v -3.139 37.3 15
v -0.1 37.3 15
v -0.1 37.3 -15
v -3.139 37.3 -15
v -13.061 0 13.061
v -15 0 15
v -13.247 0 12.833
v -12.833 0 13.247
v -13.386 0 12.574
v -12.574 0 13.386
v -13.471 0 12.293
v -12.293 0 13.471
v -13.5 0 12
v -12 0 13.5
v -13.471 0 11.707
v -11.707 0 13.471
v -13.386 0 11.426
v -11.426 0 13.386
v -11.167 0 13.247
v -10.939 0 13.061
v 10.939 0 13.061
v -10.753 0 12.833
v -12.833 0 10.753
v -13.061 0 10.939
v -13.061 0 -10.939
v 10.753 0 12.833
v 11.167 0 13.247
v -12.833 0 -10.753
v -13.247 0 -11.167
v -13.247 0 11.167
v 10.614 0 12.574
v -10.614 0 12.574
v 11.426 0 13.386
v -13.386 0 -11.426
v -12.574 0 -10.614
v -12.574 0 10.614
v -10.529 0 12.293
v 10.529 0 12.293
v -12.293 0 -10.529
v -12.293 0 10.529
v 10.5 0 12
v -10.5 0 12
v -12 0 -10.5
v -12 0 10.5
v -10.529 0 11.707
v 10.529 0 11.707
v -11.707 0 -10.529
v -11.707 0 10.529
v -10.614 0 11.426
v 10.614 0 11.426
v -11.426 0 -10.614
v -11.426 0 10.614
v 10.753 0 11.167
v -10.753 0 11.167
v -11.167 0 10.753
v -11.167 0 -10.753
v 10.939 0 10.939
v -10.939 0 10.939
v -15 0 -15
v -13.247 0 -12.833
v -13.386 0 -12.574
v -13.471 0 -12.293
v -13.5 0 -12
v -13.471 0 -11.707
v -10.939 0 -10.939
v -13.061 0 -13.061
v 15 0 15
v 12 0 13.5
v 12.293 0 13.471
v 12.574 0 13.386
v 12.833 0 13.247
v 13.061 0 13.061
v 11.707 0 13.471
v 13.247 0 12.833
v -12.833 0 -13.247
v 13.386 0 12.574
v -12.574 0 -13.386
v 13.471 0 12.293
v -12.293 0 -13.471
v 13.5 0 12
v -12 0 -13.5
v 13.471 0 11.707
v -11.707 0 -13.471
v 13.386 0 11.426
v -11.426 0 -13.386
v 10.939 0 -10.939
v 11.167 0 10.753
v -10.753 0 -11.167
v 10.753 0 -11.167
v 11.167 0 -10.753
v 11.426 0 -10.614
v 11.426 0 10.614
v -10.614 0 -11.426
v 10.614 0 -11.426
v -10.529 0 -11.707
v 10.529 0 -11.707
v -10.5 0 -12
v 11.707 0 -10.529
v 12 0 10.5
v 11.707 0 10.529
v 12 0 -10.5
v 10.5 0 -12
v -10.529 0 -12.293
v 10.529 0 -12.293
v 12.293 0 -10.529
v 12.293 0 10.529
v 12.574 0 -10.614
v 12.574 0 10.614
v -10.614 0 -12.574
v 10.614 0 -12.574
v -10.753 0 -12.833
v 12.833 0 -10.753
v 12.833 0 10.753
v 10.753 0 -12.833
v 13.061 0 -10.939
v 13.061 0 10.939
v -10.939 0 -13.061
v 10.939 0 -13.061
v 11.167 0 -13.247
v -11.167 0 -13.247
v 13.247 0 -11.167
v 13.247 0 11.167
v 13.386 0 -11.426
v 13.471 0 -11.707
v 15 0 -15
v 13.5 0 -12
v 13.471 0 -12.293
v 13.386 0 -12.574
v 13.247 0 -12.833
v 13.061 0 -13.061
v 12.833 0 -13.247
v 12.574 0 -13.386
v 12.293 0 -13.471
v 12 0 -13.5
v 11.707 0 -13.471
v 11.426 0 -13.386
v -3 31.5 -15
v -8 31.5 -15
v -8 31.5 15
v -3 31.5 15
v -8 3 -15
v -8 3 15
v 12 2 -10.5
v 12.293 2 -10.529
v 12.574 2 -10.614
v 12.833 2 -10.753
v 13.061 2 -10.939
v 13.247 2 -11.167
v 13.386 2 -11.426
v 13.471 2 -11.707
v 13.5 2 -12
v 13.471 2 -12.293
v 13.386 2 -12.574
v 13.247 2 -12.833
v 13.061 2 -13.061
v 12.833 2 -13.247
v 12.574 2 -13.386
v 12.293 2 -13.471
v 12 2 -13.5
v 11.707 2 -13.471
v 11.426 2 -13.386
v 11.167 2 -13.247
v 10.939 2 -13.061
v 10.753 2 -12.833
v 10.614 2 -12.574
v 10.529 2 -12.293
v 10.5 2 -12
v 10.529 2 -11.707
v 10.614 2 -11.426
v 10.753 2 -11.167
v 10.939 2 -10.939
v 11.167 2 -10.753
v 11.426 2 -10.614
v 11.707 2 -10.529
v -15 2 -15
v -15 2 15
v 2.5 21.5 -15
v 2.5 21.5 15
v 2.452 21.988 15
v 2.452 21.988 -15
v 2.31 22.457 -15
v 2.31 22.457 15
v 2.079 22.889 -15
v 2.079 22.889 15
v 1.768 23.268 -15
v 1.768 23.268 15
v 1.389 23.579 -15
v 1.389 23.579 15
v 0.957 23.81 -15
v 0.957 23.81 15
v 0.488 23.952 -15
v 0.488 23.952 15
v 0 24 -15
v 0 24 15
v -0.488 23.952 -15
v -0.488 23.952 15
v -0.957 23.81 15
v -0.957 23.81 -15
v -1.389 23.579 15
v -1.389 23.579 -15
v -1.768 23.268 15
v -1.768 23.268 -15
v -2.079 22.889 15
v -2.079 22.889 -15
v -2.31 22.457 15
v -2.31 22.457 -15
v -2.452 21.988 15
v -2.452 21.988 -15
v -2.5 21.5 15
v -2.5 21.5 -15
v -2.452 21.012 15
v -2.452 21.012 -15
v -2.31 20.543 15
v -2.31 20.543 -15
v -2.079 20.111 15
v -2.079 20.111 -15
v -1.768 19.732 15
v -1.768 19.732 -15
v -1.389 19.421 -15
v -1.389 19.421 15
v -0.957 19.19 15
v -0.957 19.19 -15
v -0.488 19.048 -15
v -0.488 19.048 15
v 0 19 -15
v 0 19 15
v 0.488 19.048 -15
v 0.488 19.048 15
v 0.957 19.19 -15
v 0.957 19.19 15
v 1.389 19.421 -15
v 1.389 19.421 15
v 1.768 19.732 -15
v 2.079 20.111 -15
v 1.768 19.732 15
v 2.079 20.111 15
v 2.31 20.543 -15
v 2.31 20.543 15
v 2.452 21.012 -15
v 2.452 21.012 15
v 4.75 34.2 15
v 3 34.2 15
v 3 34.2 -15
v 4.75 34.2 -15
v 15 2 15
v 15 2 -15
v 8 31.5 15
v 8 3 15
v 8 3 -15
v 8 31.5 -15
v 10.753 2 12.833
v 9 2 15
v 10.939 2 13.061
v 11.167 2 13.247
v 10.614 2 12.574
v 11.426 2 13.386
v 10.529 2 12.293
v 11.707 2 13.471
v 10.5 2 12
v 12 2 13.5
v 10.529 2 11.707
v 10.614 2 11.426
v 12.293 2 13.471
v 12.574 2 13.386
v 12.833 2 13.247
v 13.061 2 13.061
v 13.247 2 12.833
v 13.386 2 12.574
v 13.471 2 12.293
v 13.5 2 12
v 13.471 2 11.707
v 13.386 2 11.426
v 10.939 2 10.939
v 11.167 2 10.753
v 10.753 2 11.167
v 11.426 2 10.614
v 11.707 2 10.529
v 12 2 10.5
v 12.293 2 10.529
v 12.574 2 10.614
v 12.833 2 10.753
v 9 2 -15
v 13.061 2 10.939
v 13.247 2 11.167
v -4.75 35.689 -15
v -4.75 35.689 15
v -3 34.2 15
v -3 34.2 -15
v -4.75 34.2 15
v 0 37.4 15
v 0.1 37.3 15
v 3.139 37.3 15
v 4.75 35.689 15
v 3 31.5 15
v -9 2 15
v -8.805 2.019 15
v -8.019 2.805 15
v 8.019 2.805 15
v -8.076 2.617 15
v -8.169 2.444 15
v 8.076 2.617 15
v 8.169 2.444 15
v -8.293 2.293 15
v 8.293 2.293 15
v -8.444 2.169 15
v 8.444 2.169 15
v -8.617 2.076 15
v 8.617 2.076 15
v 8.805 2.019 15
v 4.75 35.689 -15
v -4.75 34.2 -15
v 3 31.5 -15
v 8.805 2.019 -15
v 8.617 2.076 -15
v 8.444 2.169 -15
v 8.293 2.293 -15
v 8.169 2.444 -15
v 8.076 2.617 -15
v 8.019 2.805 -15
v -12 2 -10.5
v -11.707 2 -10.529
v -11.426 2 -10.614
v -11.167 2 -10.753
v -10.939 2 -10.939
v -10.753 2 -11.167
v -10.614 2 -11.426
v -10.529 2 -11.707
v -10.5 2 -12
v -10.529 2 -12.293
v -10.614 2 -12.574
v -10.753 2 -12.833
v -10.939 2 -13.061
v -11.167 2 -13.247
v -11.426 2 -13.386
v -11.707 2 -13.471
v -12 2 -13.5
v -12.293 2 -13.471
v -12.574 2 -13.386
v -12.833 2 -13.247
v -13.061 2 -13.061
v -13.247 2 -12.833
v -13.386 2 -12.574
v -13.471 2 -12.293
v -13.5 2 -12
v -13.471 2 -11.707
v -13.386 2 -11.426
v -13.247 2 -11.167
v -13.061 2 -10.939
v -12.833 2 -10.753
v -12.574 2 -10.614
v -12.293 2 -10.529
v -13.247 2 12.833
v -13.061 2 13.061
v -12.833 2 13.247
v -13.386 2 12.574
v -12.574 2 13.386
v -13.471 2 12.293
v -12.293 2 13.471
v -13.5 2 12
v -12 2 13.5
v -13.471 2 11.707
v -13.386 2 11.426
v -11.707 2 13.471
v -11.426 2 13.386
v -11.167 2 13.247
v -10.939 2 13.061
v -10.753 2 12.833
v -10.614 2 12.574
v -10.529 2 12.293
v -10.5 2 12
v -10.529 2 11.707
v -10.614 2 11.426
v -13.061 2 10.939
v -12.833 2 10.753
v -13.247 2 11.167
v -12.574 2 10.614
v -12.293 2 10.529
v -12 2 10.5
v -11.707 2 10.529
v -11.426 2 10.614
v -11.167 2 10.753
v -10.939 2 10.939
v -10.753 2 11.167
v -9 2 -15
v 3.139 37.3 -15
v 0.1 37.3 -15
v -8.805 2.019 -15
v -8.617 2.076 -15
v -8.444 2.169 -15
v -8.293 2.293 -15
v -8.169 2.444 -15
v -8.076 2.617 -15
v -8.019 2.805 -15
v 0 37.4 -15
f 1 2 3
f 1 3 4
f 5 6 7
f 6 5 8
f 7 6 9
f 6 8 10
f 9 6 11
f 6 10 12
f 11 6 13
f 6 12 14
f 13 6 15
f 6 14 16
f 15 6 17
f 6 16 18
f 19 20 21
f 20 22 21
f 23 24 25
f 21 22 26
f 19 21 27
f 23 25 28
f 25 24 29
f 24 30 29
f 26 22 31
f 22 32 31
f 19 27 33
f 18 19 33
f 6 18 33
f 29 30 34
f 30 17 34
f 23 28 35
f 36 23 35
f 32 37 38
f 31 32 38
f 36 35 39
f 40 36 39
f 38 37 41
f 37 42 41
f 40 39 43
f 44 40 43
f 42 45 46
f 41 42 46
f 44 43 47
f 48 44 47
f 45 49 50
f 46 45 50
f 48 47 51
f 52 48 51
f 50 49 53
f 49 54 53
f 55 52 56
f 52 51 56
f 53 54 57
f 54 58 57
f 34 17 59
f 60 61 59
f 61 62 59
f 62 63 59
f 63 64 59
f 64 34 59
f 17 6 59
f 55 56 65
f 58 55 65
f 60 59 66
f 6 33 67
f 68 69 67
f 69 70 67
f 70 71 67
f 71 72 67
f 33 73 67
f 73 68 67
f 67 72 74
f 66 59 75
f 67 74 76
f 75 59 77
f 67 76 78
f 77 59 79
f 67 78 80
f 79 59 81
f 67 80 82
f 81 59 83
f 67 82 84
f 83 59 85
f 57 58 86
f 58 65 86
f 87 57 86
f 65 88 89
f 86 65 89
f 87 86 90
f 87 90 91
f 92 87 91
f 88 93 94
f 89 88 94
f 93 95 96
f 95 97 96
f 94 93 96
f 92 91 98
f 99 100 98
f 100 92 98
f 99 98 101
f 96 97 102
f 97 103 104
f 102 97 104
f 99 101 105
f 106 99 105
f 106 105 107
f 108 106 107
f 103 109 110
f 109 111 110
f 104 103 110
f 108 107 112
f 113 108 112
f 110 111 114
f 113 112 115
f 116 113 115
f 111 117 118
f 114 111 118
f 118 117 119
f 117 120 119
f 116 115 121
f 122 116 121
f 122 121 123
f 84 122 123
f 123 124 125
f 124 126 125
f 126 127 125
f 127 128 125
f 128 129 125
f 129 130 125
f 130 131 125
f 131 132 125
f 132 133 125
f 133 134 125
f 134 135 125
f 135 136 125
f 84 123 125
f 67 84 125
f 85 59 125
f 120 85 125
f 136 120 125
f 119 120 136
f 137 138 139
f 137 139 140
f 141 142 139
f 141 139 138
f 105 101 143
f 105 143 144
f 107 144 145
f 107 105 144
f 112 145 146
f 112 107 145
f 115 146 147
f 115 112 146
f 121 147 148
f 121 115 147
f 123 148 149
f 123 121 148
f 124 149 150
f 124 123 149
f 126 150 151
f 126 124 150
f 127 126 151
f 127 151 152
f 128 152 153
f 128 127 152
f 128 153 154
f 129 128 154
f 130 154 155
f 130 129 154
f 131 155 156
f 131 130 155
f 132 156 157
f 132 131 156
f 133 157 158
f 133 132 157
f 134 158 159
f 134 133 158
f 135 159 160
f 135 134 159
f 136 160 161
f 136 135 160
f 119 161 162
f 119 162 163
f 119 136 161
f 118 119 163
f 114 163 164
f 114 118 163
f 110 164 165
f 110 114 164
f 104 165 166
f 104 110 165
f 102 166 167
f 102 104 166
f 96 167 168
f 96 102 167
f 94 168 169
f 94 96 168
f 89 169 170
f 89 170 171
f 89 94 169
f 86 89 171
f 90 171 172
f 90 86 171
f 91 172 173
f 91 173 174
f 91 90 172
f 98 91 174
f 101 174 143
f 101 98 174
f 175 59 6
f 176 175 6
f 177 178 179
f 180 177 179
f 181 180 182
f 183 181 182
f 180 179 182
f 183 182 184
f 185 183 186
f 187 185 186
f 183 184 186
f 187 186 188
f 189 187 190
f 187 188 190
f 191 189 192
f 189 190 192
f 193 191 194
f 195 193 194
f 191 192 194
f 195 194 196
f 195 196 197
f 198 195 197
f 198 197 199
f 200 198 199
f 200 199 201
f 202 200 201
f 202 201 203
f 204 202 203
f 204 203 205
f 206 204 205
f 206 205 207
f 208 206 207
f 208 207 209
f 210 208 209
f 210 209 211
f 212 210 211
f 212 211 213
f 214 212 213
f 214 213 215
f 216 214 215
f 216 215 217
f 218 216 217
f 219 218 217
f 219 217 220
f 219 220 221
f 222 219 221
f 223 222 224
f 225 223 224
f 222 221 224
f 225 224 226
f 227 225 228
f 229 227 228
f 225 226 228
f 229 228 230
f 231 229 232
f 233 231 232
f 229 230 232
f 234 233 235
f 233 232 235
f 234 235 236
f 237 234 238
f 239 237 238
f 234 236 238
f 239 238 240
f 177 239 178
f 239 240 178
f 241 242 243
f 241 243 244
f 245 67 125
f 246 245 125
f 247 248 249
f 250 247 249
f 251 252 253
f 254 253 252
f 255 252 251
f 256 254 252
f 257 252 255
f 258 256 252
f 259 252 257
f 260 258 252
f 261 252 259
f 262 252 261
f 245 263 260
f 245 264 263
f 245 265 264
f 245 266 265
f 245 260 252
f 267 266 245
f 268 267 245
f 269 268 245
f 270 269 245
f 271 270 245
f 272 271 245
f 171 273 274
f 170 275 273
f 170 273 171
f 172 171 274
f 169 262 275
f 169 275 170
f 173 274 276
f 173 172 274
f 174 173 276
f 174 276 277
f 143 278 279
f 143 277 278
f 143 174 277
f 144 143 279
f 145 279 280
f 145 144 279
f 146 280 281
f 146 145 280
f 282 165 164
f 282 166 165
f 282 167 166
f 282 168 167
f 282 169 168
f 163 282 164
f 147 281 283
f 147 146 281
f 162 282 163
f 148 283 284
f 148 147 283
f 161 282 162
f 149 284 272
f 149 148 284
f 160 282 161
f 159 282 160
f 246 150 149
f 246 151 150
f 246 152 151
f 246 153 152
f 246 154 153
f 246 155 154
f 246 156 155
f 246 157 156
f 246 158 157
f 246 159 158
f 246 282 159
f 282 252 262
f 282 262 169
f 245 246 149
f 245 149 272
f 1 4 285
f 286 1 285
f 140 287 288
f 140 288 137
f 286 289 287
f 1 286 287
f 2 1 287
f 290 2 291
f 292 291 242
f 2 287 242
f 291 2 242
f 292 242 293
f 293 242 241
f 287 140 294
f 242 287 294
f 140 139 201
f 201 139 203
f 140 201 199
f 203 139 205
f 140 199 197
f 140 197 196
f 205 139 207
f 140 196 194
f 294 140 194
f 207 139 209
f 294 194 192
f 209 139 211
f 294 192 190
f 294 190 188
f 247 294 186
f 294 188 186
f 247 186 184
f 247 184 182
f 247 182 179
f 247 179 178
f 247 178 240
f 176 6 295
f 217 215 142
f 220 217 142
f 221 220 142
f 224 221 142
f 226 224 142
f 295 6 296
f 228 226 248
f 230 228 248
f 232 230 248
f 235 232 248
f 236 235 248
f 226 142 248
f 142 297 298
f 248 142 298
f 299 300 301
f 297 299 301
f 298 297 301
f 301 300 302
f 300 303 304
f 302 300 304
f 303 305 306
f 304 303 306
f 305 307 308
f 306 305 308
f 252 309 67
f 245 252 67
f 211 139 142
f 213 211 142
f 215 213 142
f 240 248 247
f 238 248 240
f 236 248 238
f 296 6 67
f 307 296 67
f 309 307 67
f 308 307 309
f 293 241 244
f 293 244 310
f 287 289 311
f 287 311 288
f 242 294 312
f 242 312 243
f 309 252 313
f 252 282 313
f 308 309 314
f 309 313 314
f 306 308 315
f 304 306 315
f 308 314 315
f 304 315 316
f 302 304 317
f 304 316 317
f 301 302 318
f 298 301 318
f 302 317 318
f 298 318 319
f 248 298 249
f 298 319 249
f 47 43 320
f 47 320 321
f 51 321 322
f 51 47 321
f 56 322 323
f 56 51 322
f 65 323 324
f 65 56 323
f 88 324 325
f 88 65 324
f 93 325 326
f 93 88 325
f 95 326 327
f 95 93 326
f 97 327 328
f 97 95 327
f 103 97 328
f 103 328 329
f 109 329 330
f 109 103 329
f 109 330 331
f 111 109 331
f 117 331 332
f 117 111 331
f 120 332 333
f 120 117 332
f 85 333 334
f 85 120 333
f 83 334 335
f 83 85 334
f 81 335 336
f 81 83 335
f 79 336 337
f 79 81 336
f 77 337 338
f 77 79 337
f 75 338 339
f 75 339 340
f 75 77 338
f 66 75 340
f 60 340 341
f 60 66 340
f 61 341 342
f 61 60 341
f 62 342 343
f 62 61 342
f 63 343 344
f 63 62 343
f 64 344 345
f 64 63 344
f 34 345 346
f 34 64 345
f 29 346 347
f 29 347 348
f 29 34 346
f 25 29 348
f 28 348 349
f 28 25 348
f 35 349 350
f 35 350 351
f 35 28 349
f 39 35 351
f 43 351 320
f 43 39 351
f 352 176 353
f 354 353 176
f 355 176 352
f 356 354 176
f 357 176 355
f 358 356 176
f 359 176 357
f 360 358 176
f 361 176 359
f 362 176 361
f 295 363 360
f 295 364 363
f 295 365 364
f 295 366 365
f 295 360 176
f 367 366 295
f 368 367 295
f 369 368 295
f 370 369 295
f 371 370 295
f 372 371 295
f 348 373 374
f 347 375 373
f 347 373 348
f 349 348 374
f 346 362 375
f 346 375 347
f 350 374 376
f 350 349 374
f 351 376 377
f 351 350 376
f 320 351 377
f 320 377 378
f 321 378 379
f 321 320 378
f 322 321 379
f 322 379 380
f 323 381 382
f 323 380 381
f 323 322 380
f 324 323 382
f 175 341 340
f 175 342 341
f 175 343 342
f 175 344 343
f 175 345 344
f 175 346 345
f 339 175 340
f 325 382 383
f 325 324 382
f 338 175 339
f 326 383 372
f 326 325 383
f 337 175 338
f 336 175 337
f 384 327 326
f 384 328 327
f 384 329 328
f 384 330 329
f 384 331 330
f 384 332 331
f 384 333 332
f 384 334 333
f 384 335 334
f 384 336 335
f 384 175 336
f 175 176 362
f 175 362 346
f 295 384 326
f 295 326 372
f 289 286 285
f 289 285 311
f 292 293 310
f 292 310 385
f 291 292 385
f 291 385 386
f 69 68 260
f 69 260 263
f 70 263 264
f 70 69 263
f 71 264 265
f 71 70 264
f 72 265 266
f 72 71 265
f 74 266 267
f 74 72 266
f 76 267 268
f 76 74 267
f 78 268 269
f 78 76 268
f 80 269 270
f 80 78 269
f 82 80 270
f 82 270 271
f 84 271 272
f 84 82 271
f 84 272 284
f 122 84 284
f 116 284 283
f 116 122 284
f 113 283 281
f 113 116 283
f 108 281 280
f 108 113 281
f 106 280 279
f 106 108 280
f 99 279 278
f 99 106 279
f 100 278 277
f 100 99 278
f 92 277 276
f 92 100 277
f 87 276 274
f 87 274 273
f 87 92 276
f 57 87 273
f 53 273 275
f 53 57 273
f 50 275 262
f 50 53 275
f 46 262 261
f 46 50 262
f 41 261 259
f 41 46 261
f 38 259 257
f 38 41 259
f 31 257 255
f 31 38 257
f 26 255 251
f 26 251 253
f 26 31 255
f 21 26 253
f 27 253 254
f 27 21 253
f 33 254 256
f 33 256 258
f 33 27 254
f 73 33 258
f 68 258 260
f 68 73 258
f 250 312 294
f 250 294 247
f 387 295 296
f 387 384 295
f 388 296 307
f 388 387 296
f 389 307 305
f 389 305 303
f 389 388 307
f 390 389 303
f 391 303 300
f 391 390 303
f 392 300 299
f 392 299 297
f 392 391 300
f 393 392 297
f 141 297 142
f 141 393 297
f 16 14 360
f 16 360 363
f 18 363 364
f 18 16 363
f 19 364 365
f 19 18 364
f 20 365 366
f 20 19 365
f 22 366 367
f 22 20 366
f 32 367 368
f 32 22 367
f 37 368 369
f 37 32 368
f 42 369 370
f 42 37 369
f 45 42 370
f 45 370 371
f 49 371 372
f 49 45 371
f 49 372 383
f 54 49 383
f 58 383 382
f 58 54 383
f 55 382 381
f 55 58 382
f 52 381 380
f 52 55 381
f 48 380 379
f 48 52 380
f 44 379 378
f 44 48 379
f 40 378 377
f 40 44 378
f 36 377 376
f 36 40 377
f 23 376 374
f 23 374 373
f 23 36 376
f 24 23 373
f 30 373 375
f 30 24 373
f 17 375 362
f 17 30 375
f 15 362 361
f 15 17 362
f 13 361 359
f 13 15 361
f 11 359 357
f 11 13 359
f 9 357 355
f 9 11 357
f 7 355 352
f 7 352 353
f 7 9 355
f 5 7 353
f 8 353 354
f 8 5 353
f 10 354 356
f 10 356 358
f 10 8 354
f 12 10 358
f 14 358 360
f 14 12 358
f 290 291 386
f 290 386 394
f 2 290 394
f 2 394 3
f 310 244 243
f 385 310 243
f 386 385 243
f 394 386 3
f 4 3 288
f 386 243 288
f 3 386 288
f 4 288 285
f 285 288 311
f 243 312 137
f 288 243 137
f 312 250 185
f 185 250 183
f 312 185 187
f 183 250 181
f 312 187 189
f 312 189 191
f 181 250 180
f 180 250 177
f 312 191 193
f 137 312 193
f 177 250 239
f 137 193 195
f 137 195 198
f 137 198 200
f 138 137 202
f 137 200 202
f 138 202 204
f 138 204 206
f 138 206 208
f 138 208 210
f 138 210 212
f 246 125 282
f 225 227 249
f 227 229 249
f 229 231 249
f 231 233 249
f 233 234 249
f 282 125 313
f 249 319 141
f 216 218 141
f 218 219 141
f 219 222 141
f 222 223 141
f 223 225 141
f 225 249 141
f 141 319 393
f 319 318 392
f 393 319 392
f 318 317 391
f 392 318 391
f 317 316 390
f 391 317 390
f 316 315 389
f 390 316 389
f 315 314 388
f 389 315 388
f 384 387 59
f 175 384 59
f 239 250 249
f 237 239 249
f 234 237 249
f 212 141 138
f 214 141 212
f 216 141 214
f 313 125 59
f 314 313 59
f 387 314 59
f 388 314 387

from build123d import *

# Parameters (mm, degrees)
SKETCH1_R           = 1.5
BOSS_EXTRUDE1_DEPTH = 2
SKETCH10_W          = 16
SKETCH10_H          = 30
BOSS_EXTRUDE2_DEPTH = 29.5
FILLET1_R           = 1
SKETCH11_R          = 2.5
CUT_EXTRUDE1_DEPTH  = 32.5
BOSS_EXTRUDE4_DEPTH = 30


with BuildPart() as part:
    # Sketch1 → Boss-Extrude1 (new body)
    # profile 1 of 5: a face of its own
    with BuildSketch(Plane(origin=(0, 0, 0), x_dir=(1, 0, 0), z_dir=(0, 1, 0))):
        with BuildLine():
            Line((-15, -7), (-15, -15))
            Line((-15, -15), (-7, -15))
            ThreePointArc((-7, -15), (-9.343145751, -9.343145751), (-15, -7))
        make_face()
        with Locations(Location((-12, -12, 0), (0, 0, 270))):
            Circle(SKETCH1_R, mode=Mode.SUBTRACT)
    # profile 2 of 5: a face of its own
    with BuildSketch(Plane(origin=(0, 0, 0), x_dir=(1, 0, 0), z_dir=(0, 1, 0))):
        with BuildLine():
            ThreePointArc((15, -7), (9.343145751, -9.343145751), (7, -15))
            Line((7, -15), (15, -15))
            Line((15, -15), (15, -7))
        make_face()
        with Locations(Location((12, -12, 0), (0, 0, 270))):
            Circle(SKETCH1_R, mode=Mode.SUBTRACT)
    # profile 3 of 5: a face of its own
    with BuildSketch(Plane(origin=(0, 0, 0), x_dir=(1, 0, 0), z_dir=(0, 1, 0))):
        with BuildLine():
            ThreePointArc((-15, -7), (-9.343145751, -9.343145751), (-7, -15))
            Line((-7, -15), (7, -15))
            ThreePointArc((7, -15), (9.343145751, -9.343145751), (15, -7))
            Line((15, -7), (15, 7))
            ThreePointArc((15, 7), (9.343145751, 9.343145751), (7, 15))
            Line((7, 15), (-7, 15))
            ThreePointArc((-7, 15), (-9.343145751, 9.343145751), (-15, 7))
            Line((-15, 7), (-15, -7))
        make_face()
    # profile 4 of 5: a face of its own
    with BuildSketch(Plane(origin=(0, 0, 0), x_dir=(1, 0, 0), z_dir=(0, 1, 0))):
        with BuildLine():
            ThreePointArc((7, 15), (9.343145751, 9.343145751), (15, 7))
            Line((15, 7), (15, 15))
            Line((15, 15), (7, 15))
        make_face()
        with Locations(Location((12, 12, 0), (0, 0, 270))):
            Circle(SKETCH1_R, mode=Mode.SUBTRACT)
    # profile 5 of 5: a face of its own
    with BuildSketch(Plane(origin=(0, 0, 0), x_dir=(1, 0, 0), z_dir=(0, 1, 0))):
        with BuildLine():
            Line((-15, 15), (-15, 7))
            ThreePointArc((-15, 7), (-9.343145751, 9.343145751), (-7, 15))
            Line((-7, 15), (-15, 15))
        make_face()
        with Locations(Location((-12, 12, 0), (0, 0, 270))):
            Circle(SKETCH1_R, mode=Mode.SUBTRACT)
    extrude(amount=BOSS_EXTRUDE1_DEPTH)

    # Sketch10 → Boss-Extrude2 (add)
    with BuildSketch(Plane(origin=(0, 2, 0), x_dir=(1, 0, 0), z_dir=(0, 1, 0))):
        Rectangle(SKETCH10_W, SKETCH10_H)
    extrude(amount=BOSS_EXTRUDE2_DEPTH)

    # Fillet1
    fillet1_edges = [part.edges().sort_by_distance(p)[0] for p in [
        (-8, 2, 0),
        (8, 2, 0),
    ]]
    fillet(fillet1_edges, radius=FILLET1_R)

    # Sketch11 → Cut-Extrude1 (cut)
    with BuildSketch(Plane.XY.offset(15)):
        with Locations((0, 21.5)):
            Circle(SKETCH11_R)
    extrude(amount=-CUT_EXTRUDE1_DEPTH, mode=Mode.SUBTRACT)

    # Sketch13 → Boss-Extrude4 (add)
    with BuildSketch(Plane.XY.offset(15)):
        Polygon((-4.75, 34.2), (-3, 34.2), (-3, 33.3), (-3, 33.25), (-3, 31.5), (3, 31.5), (3, 33.25), (3, 33.3), (3, 34.2), (4.75, 34.2), (4.75, 35.689339828), (3.139339828, 37.3), (0.1, 37.3), (0, 37.4), (-0.1, 37.3), (-3.139339828, 37.3), (-4.75, 35.689339828), align=None)
    extrude(amount=-BOSS_EXTRUDE4_DEPTH)


solid = part.part
